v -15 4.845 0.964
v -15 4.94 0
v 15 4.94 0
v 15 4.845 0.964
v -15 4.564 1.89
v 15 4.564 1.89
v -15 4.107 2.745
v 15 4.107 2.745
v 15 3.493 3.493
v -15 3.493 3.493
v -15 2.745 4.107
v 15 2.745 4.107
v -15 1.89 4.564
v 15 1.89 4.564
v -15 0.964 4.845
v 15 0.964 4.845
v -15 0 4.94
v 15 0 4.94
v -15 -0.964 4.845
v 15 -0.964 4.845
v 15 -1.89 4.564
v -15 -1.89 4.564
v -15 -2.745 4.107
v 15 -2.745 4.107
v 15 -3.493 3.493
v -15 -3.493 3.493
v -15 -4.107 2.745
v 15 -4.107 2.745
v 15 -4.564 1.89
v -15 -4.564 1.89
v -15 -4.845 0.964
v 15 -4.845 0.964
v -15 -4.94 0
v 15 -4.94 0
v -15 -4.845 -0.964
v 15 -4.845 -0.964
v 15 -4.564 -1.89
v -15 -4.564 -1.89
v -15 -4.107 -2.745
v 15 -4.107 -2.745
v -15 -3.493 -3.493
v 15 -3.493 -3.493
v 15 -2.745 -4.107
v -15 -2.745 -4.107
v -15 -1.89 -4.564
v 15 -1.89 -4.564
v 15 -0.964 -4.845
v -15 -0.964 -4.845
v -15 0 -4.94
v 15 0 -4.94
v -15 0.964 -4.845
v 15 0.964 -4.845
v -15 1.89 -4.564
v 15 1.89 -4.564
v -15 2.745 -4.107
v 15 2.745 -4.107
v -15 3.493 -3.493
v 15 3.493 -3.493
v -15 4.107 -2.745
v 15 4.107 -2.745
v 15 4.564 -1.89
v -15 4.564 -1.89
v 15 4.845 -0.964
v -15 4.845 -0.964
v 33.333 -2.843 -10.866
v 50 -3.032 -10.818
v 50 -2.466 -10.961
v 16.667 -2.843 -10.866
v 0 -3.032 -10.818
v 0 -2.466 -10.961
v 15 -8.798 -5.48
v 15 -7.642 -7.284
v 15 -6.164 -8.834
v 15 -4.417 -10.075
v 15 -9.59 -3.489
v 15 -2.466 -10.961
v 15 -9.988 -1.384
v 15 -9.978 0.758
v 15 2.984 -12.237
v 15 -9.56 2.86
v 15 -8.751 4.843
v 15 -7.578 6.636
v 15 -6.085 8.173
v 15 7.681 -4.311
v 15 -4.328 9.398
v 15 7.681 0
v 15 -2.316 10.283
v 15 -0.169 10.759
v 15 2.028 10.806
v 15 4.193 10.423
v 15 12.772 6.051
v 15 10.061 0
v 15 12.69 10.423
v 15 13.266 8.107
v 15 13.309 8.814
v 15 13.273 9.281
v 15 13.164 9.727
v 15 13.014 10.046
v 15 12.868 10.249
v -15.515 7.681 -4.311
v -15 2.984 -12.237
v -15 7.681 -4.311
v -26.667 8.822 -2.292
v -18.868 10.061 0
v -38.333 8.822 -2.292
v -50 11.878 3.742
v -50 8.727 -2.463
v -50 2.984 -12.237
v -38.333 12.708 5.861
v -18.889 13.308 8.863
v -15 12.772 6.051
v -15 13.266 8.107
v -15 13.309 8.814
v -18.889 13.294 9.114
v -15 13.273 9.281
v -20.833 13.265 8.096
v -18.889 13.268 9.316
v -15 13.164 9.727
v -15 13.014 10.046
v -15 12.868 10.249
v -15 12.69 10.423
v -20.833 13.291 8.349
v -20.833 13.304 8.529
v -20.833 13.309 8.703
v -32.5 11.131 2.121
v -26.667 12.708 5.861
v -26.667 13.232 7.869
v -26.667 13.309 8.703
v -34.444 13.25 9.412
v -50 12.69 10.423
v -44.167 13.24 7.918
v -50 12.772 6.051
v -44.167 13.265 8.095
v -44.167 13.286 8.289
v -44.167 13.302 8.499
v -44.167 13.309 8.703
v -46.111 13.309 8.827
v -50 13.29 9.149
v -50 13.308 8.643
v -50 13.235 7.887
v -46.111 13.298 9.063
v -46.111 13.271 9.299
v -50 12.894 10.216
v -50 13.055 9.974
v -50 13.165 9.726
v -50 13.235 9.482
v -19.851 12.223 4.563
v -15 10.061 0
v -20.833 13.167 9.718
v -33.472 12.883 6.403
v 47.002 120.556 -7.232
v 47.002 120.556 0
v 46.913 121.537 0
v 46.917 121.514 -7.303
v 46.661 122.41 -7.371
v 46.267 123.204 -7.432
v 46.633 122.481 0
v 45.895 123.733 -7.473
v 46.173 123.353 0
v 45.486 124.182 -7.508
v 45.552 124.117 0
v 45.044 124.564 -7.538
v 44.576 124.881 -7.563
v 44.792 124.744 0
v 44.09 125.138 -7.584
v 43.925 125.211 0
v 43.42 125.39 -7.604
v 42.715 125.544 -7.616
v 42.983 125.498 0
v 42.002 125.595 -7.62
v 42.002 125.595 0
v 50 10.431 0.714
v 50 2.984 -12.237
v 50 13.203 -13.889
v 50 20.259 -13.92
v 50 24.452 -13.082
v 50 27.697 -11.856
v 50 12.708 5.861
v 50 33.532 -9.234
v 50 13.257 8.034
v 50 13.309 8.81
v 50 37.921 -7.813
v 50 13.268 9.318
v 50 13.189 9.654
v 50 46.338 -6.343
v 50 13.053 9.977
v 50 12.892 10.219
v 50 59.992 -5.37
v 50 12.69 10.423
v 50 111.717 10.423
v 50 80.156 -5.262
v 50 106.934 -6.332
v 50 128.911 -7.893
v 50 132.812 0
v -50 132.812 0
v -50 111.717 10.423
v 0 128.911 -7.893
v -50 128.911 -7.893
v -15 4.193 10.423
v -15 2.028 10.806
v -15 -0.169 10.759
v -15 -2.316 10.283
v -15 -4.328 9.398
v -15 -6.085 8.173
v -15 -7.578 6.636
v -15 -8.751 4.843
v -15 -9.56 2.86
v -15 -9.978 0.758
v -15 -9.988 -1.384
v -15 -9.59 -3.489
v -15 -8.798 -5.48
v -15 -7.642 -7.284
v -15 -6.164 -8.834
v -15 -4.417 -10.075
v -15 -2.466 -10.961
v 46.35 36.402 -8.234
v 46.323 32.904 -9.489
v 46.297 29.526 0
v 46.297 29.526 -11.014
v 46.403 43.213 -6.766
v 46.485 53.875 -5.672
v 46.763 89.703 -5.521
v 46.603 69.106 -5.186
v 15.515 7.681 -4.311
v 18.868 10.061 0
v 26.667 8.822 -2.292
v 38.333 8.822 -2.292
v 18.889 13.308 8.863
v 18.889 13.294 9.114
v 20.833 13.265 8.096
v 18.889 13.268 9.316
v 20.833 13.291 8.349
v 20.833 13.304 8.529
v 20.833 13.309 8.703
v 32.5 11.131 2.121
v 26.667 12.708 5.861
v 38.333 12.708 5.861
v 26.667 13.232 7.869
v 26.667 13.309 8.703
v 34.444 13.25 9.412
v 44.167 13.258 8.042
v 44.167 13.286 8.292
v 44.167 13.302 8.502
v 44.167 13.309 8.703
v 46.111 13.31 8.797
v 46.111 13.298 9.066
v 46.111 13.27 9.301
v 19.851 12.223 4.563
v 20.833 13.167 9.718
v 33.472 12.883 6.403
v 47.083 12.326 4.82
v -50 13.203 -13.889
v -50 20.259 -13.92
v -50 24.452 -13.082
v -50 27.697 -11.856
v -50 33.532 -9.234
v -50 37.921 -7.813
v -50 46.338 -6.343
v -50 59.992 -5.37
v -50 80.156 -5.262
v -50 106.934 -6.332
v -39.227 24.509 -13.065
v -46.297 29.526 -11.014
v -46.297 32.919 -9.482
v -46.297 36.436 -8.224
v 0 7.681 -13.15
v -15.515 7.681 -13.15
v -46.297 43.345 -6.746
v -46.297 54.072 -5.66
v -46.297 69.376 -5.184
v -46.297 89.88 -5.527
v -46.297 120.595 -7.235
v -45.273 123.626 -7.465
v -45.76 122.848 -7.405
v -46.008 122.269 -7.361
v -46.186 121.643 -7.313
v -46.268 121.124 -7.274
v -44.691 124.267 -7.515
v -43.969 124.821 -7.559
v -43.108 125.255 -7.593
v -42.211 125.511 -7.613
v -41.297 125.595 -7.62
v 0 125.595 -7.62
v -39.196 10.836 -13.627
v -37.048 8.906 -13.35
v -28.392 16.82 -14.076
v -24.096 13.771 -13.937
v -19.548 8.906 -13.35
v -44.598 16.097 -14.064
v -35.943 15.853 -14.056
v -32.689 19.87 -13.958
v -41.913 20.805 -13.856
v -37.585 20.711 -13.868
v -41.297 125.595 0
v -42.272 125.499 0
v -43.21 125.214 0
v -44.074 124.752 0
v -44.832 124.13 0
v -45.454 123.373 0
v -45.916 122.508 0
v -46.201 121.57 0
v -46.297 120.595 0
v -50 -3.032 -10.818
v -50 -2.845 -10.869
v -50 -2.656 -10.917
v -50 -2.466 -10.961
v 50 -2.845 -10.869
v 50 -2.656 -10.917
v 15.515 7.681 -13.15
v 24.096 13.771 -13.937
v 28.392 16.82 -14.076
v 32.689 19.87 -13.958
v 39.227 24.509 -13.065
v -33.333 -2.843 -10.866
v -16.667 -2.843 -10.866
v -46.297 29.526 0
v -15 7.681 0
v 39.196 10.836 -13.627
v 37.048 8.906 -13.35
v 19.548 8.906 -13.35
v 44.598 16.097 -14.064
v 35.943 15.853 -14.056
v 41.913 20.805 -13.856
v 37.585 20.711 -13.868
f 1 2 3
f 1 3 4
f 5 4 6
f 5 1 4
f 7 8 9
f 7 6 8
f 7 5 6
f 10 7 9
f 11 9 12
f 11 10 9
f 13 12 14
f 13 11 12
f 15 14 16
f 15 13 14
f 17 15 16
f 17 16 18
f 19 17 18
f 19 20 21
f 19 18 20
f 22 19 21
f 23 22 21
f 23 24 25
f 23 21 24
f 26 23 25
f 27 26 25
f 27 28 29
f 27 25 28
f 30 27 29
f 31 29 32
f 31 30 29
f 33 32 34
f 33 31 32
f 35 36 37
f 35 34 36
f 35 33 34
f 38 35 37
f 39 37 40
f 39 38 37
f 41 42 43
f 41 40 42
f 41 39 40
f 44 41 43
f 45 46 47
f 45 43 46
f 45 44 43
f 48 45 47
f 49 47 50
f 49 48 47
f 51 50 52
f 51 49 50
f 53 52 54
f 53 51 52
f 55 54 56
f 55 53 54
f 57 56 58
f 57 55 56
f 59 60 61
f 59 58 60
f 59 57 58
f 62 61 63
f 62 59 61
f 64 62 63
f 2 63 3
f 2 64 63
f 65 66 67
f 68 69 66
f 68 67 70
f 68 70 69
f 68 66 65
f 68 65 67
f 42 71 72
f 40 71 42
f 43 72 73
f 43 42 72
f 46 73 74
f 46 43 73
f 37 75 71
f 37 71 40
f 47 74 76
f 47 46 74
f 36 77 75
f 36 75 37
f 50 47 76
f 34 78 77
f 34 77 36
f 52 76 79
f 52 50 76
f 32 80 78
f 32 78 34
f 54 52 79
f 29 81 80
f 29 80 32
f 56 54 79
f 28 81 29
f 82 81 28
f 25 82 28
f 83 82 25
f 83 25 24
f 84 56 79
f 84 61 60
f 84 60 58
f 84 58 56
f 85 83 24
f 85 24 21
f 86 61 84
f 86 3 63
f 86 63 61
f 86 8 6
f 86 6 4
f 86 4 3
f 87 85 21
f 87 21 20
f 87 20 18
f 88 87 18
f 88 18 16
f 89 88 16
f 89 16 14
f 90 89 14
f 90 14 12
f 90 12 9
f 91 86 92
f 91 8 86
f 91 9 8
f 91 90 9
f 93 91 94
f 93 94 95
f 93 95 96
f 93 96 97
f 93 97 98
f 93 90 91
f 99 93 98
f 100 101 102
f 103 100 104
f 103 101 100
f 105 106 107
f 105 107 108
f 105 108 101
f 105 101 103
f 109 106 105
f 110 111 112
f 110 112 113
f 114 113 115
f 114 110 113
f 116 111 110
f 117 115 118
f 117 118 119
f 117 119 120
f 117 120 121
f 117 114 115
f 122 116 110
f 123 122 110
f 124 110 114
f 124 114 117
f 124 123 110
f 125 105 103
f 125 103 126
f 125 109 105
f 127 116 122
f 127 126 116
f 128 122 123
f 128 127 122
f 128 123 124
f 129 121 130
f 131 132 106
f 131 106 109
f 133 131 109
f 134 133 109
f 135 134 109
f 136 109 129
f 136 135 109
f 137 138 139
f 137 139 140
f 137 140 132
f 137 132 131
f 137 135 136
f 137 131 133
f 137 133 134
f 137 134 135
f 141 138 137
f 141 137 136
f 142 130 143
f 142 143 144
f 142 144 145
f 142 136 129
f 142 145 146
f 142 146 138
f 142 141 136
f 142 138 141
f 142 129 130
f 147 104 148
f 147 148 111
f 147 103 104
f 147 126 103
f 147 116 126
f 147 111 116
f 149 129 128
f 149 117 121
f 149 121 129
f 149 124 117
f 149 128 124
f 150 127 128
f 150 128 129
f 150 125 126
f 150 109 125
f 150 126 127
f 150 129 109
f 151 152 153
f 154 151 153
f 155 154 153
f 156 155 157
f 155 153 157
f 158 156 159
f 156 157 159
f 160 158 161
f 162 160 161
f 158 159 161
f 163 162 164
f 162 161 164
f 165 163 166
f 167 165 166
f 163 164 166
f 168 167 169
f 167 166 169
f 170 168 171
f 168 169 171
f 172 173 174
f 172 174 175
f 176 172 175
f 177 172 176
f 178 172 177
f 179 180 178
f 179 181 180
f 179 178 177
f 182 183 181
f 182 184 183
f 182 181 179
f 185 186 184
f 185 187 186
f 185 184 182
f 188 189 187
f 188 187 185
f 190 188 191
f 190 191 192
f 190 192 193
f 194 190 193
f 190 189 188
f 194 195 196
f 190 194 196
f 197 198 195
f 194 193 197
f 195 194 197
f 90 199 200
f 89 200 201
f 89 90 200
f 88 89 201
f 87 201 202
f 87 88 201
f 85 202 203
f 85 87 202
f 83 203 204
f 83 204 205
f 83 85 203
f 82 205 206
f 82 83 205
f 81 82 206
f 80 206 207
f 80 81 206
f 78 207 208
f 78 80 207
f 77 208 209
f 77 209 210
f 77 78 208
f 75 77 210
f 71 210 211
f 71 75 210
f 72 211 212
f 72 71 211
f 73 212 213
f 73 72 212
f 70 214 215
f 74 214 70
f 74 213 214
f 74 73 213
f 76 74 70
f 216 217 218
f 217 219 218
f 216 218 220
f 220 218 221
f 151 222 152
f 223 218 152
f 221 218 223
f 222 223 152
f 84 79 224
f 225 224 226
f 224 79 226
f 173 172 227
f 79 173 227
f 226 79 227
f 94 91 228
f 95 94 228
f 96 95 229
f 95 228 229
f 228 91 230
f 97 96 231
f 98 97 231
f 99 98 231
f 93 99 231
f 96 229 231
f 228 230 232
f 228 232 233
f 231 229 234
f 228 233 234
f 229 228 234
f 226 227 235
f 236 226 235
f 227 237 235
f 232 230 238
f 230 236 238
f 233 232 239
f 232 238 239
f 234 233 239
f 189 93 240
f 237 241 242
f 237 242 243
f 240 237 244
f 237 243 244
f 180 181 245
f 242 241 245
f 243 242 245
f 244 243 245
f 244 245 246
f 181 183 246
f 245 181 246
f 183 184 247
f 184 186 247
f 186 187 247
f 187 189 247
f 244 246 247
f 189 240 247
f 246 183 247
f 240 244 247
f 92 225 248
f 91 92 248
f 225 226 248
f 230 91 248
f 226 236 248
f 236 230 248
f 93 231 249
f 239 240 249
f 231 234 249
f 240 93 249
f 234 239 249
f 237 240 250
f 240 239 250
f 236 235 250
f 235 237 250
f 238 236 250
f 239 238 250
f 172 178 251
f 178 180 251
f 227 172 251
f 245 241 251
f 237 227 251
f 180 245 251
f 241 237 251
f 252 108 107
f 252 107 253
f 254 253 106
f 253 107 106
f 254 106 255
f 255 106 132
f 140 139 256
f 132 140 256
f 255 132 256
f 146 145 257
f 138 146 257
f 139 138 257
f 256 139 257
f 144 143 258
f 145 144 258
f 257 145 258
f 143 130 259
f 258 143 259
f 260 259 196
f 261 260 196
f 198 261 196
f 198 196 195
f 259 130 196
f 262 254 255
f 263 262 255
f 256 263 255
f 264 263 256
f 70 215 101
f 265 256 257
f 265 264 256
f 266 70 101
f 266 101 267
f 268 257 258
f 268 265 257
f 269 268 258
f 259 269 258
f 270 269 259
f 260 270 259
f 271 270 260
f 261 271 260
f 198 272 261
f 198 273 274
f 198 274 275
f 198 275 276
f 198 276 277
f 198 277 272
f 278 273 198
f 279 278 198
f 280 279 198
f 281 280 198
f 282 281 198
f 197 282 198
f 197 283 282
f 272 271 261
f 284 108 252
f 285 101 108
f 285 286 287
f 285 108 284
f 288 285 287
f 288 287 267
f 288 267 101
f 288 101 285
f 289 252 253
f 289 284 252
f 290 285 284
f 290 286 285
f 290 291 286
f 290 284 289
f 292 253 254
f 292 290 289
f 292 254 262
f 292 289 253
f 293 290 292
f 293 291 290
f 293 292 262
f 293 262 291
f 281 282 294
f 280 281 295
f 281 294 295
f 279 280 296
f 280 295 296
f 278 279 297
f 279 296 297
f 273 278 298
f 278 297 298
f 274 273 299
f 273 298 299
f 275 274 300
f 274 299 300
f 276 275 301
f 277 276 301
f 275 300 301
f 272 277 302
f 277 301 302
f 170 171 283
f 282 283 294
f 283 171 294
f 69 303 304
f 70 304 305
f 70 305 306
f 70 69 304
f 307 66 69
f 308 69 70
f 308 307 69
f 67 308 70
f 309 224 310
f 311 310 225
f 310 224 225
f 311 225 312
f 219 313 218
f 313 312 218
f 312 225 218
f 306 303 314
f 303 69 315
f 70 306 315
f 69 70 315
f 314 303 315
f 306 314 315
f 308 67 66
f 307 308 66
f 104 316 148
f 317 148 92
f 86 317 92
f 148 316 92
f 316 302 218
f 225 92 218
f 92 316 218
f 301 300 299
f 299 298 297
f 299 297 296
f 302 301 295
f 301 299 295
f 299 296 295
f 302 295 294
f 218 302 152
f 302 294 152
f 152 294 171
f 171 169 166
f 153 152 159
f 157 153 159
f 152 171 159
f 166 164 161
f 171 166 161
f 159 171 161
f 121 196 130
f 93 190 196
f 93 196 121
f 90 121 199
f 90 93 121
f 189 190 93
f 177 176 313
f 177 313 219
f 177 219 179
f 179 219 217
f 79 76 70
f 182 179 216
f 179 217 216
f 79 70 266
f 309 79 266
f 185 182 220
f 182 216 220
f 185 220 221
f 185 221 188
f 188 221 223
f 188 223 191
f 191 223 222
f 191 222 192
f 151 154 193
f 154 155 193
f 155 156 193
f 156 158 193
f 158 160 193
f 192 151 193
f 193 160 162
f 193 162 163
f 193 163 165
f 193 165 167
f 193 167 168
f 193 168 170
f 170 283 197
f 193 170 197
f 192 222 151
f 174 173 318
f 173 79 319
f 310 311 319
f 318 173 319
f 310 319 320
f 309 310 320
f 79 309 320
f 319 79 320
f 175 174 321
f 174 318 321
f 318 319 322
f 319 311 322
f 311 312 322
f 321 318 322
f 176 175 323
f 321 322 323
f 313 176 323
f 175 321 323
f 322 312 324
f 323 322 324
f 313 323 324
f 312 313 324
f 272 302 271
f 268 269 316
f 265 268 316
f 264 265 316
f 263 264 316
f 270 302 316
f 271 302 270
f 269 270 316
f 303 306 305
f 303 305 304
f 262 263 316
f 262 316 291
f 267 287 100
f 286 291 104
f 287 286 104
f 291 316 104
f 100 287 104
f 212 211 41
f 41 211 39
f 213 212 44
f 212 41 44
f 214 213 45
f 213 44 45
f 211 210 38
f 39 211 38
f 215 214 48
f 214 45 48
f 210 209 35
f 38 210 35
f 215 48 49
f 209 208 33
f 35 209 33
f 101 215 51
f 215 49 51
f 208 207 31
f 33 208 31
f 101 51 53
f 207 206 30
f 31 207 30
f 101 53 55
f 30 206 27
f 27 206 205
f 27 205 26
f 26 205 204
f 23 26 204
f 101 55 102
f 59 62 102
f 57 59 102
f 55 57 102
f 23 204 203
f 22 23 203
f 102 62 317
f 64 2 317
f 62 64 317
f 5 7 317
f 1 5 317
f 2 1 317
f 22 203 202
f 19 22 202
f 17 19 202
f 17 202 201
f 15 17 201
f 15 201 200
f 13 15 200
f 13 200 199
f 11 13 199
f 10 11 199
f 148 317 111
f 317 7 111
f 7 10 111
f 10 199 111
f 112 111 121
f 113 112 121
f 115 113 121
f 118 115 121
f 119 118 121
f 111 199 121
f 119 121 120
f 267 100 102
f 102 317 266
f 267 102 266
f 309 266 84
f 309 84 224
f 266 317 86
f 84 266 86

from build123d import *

# Parameters (mm, degrees)
F1_DEPTH = 50
F0_R     = 4.94
F2_R     = 4.94
F3_DEPTH = 35
F5_DEPTH = 25


# Not quite as in the source:
# - a pattern or mirror of a feature is missing from the dataset's text; its kind, count and spacing are read off the source's solid


with BuildPart() as f1:
    # F0 (on Right) → F1 (new body, symmetric)
    with BuildSketch(Plane.YZ):
        with BuildLine():
            add(Edge.make_bspline(
                [(-3.0323168048, -10.8181582689), (-2.8424272556, -10.8663900835), (-2.6538250298, -10.9140078026), (-2.4664978488, -10.9610164628)],
                knots=[0, 0, 0, 0, 0.0026237907, 0.0026237907, 0.0026237907, 0.0026237907], degree=3))
            ThreePointArc((-3.0323168048, -10.8181582689), (-2.7503350277, -10.8932617141), (-2.4664978488, -10.9610164628))
        make_face()
    extrude(amount=F1_DEPTH, both=True)


with BuildPart() as f1b:
    # F0 (on Right) → F1, piece 2 (new body, symmetric)
    with BuildSketch(Plane.YZ):
        with BuildLine():
            ThreePointArc((4.1932159041, 10.4232640722), (-9.5274989599, 2.9671522383), (-2.4664978488, -10.9610164628))
            add(Edge.make_bspline(
                [(-2.4664978488, -10.9610164628), (25.9397967098, -18.0894099096), (23.6511889197, -0.8509774431), (106.1659529805, -5.9674950317), (128.9111768297, -7.8934305644)],
                knots=[0.0026237907, 0.0026237907, 0.0026237907, 0.0026237907, 0.4004954175, 1, 1, 1, 1], degree=3))
            Line((128.9111768297, -7.8934305644), (132.8115165234, 0))
            Line((132.8115165234, 0), (111.7171202219, 10.4232640722))
            Line((111.7171202219, 10.4232640722), (4.1932159041, 10.4232640722))
        make_face()
        Circle(F0_R, mode=Mode.SUBTRACT)
    extrude(amount=F1_DEPTH, both=True)

    # F2 (on face) → F3 (cut)
    with BuildSketch(Plane.YZ.offset(50)):
        with BuildLine():
            Line((6.8677525204, 10.4232640722), (4.1932159041, 10.4232640722))
            ThreePointArc((4.1932159041, 10.4232640722), (-0.1693274921, 10.7589359529), (-4.3277336512, 9.3980102714))
            add(Edge.make_bspline(
                [(6.8677525204, 10.4232640722), (3.5056440269, 9.7988076387), (-0.669971735, 8.8655469209), (-4.3277336512, 9.3980102714)],
                knots=[0.4757656296, 0.4757656296, 0.4757656296, 0.4757656296, 0.6363648624, 0.6363648624, 0.6363648624, 0.6363648624], degree=3))
        make_face()
        with BuildLine():
            add(Edge.make_bspline(
                [(12.6898856834, 10.4232640722), (11.721497416, 11.2240656804), (9.5543495494, 10.9222553456), (6.8677525204, 10.4232640722)],
                knots=[0.3474338334, 0.3474338334, 0.3474338334, 0.3474338334, 0.4757656296, 0.4757656296, 0.4757656296, 0.4757656296], degree=3))
            Line((6.8677525204, 10.4232640722), (12.6898856834, 10.4232640722))
        make_face()
        with BuildLine():
            Line((12.6898856834, 10.4232640722), (6.8677525204, 10.4232640722))
            add(Edge.make_bspline(
                [(6.8677525204, 10.4232640722), (3.5056440269, 9.7988076387), (-0.669971735, 8.8655469209), (-4.3277336512, 9.3980102714)],
                knots=[0.4757656296, 0.4757656296, 0.4757656296, 0.4757656296, 0.6363648624, 0.6363648624, 0.6363648624, 0.6363648624], degree=3))
            ThreePointArc((-4.3277336512, 9.3980102714), (-9.9876923855, -1.3840180073), (-2.4664978488, -10.9610164628))
            add(Edge.make_bspline(
                [(-2.4664978488, -10.9610164628), (-0.516074965, -11.4504636758), (1.2961245634, -11.8738848534), (2.9839597919, -12.2369650055)],
                knots=[0.0026237907, 0.0026237907, 0.0026237907, 0.0026237907, 0.0299423107, 0.0299423107, 0.0299423107, 0.0299423107], degree=3))
            add(Edge.make_bspline(
                [(2.9839597919, -12.2369650055), (9.1470031068, -1.994389644), (15.3116120056, 8.255246629), (12.6898856834, 10.4232640722)],
                knots=[0, 0, 0, 0, 0.3474338334, 0.3474338334, 0.3474338334, 0.3474338334], degree=3))
        make_face()
        Circle(F2_R, mode=Mode.SUBTRACT)
        Circle(F2_R)
    f3 = extrude(amount=-F3_DEPTH, mode=Mode.SUBTRACT)

    # F3_copies: F3 across plane
    add(f3.mirror(Plane(origin=(-1.2e-05, 0, 0), x_dir=(0, 0, -1), z_dir=(-1, 0, 0))), mode=Mode.SUBTRACT)

    # F4 (on Top) → F5 (cut)
    with BuildSketch(Plane.XY):
        with BuildLine():
            Line((-46.2965779006, 29.526354745), (-15.5149381608, 7.6813208871))
            Line((-15.5149381608, 7.6813208871), (15.5149381608, 7.6813208871))
            Line((15.5149381608, 7.6813208871), (46.2965779006, 29.526354745))
            Line((46.2965779006, 29.526354745), (47.0022331808, 120.5560959189))
            ThreePointArc((47.0022331808, 120.5560959189), (45.5515940339, 124.1166584252), (42.0023834047, 125.5948543549))
            Line((42.0023834047, 125.5948543549), (-41.2965779006, 125.5948543549))
            ThreePointArc((-41.2965779006, 125.5948543549), (-44.8321118066, 124.1303882608), (-46.2965779006, 120.5948543549))
            Line((-46.2965779006, 120.5948543549), (-46.2965779006, 29.526354745))
        make_face()
    extrude(amount=-F5_DEPTH, mode=Mode.SUBTRACT)


solid = Compound([f1.part, f1b.part])
